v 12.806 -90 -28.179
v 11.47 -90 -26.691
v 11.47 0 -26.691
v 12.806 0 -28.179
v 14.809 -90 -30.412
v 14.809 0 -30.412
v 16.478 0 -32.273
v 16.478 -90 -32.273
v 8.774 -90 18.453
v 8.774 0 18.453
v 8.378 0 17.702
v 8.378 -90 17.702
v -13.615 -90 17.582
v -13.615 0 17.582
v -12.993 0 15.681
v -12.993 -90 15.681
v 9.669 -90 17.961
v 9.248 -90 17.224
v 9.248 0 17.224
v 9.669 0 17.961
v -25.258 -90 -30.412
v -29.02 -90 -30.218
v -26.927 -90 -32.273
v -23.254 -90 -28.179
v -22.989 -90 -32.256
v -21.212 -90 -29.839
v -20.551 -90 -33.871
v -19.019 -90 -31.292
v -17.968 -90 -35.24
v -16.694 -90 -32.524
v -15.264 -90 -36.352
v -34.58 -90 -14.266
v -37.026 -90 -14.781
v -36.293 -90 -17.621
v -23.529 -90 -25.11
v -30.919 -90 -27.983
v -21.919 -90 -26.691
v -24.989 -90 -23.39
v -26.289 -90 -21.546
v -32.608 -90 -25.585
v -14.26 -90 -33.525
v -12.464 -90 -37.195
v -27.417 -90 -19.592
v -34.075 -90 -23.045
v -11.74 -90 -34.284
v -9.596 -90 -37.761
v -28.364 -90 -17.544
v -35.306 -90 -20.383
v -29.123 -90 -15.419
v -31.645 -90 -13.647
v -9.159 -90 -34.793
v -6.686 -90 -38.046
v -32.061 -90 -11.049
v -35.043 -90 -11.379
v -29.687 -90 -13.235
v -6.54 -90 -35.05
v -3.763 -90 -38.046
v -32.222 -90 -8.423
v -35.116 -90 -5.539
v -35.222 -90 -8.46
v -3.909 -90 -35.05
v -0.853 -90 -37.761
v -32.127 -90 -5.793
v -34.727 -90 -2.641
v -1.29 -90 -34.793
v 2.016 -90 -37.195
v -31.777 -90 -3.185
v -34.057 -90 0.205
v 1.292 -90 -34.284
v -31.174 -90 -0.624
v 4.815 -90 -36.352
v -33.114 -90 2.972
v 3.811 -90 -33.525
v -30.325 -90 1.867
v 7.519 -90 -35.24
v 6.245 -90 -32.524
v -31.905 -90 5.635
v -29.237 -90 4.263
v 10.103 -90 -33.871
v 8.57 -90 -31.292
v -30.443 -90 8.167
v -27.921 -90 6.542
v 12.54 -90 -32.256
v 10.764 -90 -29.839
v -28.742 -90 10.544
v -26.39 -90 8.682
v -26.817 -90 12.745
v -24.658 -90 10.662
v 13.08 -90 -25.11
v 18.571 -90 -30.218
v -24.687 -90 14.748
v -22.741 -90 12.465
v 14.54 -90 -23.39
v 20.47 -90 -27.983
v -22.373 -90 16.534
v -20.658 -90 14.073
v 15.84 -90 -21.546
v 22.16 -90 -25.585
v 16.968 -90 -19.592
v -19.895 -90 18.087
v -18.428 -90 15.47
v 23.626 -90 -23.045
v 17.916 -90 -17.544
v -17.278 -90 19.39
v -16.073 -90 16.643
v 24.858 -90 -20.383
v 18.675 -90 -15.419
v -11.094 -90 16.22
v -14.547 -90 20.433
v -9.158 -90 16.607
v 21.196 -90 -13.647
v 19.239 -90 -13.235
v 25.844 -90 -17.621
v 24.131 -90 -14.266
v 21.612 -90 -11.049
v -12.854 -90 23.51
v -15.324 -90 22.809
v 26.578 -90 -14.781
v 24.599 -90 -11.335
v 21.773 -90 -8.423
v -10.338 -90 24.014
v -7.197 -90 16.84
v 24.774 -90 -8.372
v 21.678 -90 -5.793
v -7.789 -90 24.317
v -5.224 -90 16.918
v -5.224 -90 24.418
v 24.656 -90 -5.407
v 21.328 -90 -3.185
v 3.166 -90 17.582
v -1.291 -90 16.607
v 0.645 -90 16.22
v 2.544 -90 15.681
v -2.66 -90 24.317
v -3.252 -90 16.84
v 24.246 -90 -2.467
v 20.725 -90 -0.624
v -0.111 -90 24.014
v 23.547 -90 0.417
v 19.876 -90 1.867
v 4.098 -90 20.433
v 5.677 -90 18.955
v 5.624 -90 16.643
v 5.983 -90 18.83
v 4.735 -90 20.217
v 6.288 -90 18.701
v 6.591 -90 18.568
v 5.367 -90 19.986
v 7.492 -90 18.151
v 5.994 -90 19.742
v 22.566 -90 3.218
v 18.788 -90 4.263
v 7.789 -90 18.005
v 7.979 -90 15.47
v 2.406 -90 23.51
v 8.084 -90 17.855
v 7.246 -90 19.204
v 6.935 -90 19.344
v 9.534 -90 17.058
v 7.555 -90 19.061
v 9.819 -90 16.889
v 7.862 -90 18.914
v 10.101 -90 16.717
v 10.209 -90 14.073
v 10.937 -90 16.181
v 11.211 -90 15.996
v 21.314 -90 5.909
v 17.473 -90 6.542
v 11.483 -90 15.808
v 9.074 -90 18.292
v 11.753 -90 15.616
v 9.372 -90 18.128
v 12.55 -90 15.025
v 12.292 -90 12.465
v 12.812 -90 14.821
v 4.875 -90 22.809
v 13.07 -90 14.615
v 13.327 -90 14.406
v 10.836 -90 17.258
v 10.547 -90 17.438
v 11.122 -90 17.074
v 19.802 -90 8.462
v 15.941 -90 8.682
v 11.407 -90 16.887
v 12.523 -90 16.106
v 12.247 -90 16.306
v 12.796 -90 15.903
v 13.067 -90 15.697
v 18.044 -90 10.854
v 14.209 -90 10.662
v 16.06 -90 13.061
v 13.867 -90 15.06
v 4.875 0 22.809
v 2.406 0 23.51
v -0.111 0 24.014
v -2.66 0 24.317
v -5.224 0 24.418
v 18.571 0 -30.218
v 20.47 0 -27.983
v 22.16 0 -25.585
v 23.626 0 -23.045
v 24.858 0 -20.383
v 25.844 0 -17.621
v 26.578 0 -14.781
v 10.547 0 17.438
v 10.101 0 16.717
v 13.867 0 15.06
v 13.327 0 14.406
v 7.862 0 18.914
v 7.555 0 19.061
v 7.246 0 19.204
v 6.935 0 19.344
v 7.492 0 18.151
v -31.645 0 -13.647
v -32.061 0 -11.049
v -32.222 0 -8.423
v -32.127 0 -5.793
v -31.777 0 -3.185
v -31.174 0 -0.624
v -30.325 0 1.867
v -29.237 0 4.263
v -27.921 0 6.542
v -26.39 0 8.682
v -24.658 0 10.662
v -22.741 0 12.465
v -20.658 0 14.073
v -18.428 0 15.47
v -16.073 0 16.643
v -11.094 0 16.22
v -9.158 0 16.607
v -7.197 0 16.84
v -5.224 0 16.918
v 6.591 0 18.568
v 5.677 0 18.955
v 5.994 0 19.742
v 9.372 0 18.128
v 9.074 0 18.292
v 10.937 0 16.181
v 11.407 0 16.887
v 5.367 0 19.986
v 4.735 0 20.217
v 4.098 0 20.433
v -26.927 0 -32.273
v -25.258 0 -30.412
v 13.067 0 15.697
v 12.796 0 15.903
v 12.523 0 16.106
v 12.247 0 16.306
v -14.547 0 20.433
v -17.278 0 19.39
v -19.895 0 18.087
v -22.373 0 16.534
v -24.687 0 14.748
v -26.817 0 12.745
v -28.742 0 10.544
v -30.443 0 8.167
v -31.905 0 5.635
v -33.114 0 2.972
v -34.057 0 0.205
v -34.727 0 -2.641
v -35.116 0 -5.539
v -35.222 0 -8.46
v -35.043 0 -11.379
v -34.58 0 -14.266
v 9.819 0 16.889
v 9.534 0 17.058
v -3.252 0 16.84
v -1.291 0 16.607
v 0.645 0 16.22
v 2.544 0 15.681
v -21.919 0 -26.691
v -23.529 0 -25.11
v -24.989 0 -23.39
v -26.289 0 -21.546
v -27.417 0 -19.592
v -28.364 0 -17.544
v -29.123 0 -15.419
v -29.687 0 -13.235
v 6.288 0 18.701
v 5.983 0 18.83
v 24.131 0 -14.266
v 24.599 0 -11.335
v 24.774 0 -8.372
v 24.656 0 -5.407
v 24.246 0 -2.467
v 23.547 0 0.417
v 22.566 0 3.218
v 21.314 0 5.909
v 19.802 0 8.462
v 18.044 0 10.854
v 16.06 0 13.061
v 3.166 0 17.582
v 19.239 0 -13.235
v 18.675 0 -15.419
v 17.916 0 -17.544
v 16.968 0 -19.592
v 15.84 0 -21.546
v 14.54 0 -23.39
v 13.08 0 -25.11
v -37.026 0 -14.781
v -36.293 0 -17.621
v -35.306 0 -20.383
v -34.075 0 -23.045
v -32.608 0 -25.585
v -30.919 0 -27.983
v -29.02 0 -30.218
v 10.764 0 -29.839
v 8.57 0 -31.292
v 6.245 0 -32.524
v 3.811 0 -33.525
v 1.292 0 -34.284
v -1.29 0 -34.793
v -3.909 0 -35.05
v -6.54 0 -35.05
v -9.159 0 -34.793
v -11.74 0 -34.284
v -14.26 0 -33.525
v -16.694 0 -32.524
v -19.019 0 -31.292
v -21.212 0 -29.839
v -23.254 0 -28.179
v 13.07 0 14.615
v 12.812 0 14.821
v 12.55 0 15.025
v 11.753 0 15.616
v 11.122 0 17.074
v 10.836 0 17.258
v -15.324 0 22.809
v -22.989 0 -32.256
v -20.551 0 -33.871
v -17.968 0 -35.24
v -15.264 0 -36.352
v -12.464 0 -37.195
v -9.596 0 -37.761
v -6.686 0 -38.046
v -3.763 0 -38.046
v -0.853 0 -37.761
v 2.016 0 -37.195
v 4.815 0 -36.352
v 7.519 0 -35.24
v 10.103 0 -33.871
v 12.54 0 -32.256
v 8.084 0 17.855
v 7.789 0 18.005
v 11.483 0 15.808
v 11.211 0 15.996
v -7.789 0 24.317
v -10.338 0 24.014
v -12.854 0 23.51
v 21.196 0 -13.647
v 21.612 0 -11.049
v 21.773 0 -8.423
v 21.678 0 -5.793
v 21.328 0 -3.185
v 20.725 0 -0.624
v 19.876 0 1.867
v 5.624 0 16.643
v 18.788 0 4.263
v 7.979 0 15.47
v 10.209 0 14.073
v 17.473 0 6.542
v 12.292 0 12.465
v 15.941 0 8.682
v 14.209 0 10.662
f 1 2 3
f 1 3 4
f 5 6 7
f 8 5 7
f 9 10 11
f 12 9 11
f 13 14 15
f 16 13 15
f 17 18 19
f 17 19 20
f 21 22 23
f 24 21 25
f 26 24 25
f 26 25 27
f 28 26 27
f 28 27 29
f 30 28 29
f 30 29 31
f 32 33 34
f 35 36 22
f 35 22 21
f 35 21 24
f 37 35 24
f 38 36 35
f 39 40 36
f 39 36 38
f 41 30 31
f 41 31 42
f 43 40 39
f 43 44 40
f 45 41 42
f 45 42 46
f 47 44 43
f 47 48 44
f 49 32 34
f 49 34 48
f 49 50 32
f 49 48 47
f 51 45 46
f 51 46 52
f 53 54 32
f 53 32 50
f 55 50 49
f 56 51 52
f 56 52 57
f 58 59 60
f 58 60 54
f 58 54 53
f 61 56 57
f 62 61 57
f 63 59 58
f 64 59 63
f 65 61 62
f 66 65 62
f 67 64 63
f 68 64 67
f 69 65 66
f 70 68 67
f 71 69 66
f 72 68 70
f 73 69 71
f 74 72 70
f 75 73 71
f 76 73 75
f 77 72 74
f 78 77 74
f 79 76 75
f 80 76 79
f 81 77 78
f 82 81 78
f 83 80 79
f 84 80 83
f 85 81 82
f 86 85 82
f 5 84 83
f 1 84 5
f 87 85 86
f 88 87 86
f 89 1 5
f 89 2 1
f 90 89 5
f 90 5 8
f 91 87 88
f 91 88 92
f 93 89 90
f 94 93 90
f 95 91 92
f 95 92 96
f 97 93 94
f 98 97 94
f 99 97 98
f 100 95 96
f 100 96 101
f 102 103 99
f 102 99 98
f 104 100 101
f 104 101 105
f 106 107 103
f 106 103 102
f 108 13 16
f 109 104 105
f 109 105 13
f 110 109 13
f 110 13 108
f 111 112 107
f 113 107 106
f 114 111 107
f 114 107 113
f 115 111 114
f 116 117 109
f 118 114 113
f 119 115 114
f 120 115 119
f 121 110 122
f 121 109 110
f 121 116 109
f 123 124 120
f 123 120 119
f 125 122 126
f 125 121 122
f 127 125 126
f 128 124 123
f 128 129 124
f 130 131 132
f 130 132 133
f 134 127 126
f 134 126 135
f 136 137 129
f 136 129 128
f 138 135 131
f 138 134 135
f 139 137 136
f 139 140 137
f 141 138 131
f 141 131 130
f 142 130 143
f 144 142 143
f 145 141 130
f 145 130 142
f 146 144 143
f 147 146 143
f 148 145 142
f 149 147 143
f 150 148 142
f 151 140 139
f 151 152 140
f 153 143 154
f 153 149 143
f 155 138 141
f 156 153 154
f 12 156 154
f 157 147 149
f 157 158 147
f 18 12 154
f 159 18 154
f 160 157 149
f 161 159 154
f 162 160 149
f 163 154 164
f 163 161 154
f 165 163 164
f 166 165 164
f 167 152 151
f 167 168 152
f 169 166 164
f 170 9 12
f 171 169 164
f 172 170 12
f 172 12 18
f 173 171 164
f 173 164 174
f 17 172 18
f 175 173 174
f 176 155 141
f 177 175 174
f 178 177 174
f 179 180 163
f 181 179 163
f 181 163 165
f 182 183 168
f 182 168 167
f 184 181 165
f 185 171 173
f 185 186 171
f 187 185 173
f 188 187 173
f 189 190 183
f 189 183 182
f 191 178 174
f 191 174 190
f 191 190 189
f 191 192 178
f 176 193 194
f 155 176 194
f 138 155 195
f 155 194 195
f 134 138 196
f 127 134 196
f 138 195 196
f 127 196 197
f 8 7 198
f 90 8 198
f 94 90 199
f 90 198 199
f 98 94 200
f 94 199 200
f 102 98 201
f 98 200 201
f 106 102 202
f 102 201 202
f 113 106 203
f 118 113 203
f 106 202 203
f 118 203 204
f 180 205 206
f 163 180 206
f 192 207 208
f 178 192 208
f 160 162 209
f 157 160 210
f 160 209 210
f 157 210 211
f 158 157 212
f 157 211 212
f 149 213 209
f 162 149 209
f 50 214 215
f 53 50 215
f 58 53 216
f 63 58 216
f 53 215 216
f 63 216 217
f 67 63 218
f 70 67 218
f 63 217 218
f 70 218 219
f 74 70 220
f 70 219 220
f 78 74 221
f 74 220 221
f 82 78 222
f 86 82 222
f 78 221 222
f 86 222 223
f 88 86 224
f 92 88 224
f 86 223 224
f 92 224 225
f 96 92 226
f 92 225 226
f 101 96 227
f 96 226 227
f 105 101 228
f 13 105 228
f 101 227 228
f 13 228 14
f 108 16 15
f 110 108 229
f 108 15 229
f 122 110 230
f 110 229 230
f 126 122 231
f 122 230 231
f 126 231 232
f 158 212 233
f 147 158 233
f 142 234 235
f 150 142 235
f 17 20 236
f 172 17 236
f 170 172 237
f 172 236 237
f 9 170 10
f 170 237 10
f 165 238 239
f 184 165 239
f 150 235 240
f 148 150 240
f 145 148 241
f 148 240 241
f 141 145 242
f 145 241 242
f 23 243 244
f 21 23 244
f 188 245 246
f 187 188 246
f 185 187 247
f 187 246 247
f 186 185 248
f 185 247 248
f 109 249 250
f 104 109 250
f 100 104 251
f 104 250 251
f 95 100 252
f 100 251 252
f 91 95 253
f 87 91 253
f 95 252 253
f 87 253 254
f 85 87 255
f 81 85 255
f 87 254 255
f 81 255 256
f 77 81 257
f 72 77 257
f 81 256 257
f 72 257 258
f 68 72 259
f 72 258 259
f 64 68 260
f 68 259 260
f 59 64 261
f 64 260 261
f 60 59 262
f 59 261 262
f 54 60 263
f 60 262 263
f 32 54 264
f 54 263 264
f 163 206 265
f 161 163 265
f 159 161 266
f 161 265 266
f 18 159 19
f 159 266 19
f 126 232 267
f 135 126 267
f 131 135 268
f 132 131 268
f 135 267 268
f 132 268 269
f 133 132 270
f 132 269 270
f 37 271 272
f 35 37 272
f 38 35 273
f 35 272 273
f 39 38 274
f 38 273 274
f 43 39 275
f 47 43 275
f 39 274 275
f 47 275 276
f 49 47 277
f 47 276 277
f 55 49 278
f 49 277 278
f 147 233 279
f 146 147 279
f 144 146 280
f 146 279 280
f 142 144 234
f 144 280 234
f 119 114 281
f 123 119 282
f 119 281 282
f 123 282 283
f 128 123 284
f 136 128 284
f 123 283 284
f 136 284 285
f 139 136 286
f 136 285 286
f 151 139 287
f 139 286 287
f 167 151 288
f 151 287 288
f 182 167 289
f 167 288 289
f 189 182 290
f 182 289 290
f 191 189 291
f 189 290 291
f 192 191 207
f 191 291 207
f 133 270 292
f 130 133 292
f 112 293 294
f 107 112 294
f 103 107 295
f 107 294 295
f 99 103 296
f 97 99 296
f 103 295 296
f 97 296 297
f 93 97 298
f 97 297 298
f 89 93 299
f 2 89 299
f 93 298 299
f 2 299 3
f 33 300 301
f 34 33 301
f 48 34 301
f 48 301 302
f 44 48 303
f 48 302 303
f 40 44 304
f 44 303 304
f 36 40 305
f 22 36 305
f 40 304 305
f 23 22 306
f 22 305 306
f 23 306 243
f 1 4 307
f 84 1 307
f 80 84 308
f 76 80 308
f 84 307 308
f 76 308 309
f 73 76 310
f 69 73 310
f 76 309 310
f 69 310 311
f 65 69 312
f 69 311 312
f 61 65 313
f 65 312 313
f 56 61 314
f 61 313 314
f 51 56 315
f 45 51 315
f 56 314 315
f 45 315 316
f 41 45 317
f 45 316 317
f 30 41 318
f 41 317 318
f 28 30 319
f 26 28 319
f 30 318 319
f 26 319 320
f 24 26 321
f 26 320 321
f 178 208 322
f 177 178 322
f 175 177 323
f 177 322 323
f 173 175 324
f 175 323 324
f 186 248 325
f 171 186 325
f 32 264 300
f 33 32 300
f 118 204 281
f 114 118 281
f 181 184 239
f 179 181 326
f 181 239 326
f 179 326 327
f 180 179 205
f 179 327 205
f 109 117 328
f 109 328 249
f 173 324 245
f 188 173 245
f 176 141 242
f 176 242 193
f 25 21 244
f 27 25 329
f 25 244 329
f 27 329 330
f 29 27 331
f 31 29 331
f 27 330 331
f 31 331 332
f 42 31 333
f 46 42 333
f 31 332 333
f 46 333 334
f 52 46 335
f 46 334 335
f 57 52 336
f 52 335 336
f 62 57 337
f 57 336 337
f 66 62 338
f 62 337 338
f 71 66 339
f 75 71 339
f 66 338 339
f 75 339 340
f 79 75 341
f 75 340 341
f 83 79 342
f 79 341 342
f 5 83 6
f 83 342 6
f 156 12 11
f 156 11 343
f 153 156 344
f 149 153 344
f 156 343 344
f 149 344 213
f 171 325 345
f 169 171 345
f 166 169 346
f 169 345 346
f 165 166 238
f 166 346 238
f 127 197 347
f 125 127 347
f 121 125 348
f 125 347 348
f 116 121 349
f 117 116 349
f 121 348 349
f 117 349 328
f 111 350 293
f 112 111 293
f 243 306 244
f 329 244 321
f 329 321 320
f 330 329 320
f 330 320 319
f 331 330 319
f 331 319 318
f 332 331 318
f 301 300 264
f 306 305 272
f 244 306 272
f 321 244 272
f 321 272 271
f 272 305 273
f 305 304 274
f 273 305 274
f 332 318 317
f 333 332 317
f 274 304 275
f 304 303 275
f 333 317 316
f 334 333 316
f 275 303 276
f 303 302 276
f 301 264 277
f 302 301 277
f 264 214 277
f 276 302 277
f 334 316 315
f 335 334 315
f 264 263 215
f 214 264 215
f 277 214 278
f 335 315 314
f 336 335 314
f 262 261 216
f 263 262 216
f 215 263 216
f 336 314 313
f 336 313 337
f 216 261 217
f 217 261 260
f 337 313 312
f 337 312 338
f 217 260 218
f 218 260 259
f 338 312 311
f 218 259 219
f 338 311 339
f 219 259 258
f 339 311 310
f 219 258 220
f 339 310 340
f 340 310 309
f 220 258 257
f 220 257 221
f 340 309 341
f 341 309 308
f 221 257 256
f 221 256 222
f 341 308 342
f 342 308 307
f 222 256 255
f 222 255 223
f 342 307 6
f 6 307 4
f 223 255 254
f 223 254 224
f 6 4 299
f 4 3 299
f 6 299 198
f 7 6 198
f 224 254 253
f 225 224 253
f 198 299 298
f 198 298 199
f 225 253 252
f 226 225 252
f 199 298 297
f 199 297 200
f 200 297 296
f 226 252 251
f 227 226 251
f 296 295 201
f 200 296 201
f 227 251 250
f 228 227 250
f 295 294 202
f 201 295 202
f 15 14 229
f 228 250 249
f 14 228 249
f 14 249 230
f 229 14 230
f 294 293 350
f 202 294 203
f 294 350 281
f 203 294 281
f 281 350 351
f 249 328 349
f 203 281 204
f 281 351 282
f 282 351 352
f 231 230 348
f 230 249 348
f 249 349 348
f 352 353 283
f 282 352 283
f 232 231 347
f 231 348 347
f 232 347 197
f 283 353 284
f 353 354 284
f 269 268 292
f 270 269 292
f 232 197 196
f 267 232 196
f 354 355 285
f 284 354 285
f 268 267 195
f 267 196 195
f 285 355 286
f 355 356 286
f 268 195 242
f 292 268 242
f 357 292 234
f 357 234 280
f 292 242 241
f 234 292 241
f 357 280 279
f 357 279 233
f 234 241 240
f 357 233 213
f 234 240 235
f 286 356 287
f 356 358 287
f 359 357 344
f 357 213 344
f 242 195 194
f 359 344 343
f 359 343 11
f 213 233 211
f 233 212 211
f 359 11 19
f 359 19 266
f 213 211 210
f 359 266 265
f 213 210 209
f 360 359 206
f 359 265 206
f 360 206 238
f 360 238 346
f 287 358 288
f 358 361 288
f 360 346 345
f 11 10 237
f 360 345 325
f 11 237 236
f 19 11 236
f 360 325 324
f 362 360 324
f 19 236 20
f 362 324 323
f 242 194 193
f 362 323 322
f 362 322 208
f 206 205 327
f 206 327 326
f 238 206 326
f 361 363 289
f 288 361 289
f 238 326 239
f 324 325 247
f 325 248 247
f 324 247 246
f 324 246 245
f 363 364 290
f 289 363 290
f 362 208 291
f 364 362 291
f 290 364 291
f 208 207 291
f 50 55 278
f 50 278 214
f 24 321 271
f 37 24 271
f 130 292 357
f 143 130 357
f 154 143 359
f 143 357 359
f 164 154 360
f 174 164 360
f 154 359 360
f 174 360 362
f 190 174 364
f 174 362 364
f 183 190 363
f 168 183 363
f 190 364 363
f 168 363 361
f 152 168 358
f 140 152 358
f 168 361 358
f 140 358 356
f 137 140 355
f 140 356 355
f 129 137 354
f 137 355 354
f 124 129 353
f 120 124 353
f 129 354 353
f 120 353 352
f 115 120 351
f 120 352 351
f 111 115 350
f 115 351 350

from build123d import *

# Parameters (mm, degrees)
F1_DEPTH = 90


with BuildPart() as f1:
    # F0 (on Front) → F1 (new body)
    with BuildSketch(Plane.XZ):
        with BuildLine():
            Line((-15.323647, 22.809437), (-14.54678, 20.433205))
            ThreePointArc((-14.54678, 20.433205), (-31.205136, 6.918424), (-34.580102, -14.265527))
            Line((-34.580102, -14.265527), (-37.026413, -14.780856))
            ThreePointArc((-37.026413, -14.780856), (-33.3702, -24.331576), (-26.92714, -32.273309))
            Line((-26.92714, -32.273309), (-25.257697, -30.412407))
            ThreePointArc((-25.257697, -30.412407), (-5.224374, -38.081576), (14.808948, -30.412407))
            Line((14.808948, -30.412407), (16.478392, -32.273309))
            ThreePointArc((16.478392, -32.273309), (22.921451, -24.331576), (26.577664, -14.780856))
            Line((26.577664, -14.780856), (24.131354, -14.265527))
            ThreePointArc((24.131354, -14.265527), (23.091117, 1.829678), (13.866516, 15.060116))
            Line((13.866516, 15.060116), (13.326836, 14.405924))
            ThreePointArc((13.326836, 14.405924), (12.941248, 14.718539), (12.550393, 15.024543))
            Line((12.550393, 15.024543), (13.067485, 15.696731))
            ThreePointArc((13.067485, 15.696731), (12.659955, 16.004743), (12.247241, 16.30577))
            Line((12.247241, 16.30577), (11.753336, 15.616366))
            ThreePointArc((11.753336, 15.616366), (11.347366, 15.902013), (10.93659, 16.180706))
            Line((10.93659, 16.180706), (11.406734, 16.886528))
            ThreePointArc((11.406734, 16.886528), (10.979187, 17.166089), (10.546941, 17.43833))
            Line((10.546941, 17.43833), (10.101103, 16.716909))
            ThreePointArc((10.101103, 16.716909), (9.676632, 16.974263), (9.247842, 17.224353))
            Line((9.247842, 17.224353), (9.668858, 17.960536))
            ThreePointArc((9.668858, 17.960536), (9.223275, 18.210351), (8.773503, 18.452542))
            Line((8.773503, 18.452542), (8.377798, 17.70245))
            ThreePointArc((8.377798, 17.70245), (7.936796, 17.930319), (7.491979, 18.150645))
            Line((7.491979, 18.150645), (7.861915, 18.913776))
            ThreePointArc((7.861915, 18.913776), (7.400363, 19.132685), (6.93515, 19.343703))
            Line((6.93515, 19.343703), (6.591413, 18.568419))
            ThreePointArc((6.591413, 18.568419), (6.135926, 18.765745), (5.677145, 18.955287))
            Line((5.677145, 18.955287), (5.994285, 19.741826))
            ThreePointArc((5.994285, 19.741826), (5.051974, 20.103467), (4.098031, 20.433205))
            Line((4.098031, 20.433205), (4.874898, 22.809437))
            ThreePointArc((4.874898, 22.809437), (-0.111055, 24.013656), (-5.224374, 24.418424))
            ThreePointArc((-5.224374, 24.418424), (-10.337694, 24.013656), (-15.323647, 22.809437))
        make_face()
        with BuildLine():
            ThreePointArc((-12.993045, 15.680742), (-9.157697, 16.607064), (-5.224374, 16.918424))
            ThreePointArc((-5.224374, 16.918424), (-1.291052, 16.607064), (2.544297, 15.680742))
            Line((2.544297, 15.680742), (3.165791, 17.581727))
            ThreePointArc((3.165791, 17.581727), (18.158312, 5.418424), (21.195781, -13.647132))
            Line((21.195781, -13.647132), (19.238732, -13.234869))
            ThreePointArc((19.238732, -13.234869), (16.426261, -20.581576), (11.470061, -26.690602))
            Line((11.470061, -26.690602), (12.805616, -28.179324))
            ThreePointArc((12.805616, -28.179324), (-5.224374, -35.081576), (-23.254364, -28.179324))
            Line((-23.254364, -28.179324), (-21.91881, -26.690602))
            ThreePointArc((-21.91881, -26.690602), (-26.875009, -20.581576), (-29.687481, -13.234869))
            Line((-29.687481, -13.234869), (-31.644529, -13.647132))
            ThreePointArc((-31.644529, -13.647132), (-28.60706, 5.418424), (-13.614539, 17.581727))
            Line((-13.614539, 17.581727), (-12.993045, 15.680742))
        make_face(mode=Mode.SUBTRACT)
    extrude(amount=F1_DEPTH)


solid = f1.part
